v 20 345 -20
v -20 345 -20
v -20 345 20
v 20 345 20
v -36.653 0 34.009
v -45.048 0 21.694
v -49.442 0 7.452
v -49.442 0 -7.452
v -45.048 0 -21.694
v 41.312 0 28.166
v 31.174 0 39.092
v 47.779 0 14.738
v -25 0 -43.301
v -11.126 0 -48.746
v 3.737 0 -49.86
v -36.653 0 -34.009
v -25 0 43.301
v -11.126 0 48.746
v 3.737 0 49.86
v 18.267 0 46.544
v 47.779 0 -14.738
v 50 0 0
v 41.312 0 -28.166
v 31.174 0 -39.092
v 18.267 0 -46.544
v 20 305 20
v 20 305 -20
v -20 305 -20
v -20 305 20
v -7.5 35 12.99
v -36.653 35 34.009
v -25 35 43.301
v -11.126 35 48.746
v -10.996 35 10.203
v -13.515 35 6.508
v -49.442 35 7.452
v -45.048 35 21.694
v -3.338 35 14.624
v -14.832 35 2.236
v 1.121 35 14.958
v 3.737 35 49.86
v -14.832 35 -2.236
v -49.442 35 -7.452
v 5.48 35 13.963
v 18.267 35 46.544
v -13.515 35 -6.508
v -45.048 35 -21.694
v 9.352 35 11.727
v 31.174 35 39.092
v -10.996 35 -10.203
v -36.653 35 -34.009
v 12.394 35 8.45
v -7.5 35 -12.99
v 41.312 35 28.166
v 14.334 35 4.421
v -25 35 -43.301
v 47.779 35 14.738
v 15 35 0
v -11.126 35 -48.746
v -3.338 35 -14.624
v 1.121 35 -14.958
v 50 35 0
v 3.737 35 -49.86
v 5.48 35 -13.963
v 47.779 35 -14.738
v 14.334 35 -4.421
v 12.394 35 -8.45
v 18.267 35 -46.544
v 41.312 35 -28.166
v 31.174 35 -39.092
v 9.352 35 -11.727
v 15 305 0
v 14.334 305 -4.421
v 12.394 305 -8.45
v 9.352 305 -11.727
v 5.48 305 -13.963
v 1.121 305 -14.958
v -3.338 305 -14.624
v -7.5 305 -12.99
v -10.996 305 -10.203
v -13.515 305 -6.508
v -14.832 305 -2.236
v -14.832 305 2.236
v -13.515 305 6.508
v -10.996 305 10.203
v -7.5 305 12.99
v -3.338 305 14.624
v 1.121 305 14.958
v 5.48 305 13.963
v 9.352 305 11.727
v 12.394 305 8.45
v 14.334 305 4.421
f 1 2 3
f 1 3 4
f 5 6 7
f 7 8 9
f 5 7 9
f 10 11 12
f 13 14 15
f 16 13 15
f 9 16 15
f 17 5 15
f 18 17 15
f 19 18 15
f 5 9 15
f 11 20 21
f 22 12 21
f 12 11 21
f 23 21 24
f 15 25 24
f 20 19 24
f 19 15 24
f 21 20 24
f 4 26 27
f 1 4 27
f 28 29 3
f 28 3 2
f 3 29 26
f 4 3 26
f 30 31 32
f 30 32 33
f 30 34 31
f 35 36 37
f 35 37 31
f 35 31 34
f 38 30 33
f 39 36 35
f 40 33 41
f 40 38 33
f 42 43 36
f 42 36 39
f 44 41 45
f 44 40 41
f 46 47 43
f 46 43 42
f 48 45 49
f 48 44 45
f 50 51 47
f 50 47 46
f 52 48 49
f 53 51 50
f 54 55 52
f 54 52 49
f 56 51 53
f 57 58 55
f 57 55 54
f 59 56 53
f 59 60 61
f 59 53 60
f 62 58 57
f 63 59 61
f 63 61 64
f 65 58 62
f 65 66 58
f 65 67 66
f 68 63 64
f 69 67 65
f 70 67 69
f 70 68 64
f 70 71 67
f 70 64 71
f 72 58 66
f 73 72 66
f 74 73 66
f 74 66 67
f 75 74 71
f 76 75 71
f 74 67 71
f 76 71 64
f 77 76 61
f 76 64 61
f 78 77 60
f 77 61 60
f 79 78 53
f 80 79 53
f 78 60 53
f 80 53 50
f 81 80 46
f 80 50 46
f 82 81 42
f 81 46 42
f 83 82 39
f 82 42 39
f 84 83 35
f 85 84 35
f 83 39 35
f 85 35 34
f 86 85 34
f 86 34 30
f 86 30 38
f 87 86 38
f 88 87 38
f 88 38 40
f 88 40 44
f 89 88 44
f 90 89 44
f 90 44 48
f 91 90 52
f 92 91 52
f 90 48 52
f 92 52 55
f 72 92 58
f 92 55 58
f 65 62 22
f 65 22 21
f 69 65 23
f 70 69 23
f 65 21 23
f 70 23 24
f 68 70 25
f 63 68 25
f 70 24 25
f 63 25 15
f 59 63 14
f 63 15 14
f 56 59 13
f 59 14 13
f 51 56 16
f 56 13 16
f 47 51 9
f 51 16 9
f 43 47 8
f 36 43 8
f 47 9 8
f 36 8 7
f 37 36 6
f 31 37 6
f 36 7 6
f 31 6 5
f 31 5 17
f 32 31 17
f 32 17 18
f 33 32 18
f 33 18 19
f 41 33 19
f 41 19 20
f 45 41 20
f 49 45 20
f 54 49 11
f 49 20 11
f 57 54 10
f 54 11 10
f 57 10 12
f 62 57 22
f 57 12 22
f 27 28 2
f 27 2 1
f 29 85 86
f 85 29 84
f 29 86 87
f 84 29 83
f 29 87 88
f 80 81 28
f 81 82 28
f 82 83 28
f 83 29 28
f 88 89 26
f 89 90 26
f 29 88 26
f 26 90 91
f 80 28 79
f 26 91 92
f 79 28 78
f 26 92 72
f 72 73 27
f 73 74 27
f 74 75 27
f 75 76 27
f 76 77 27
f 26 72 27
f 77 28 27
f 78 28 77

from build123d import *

# Parameters (mm, degrees)
SKETCH1_R           = 50
BOSS_EXTRUDE1_DEPTH = 35
SKETCH2_R           = 15
BOSS_EXTRUDE2_DEPTH = 270
SKETCH3_W           = 40
SKETCH3_H           = 40
BOSS_EXTRUDE3_DEPTH = 40


with BuildPart() as part:
    # Sketch1 → Boss-Extrude1 (new body)
    with BuildSketch(Plane(origin=(0, 0, 0), x_dir=(1, 0, 0), z_dir=(0, 1, 0))):
        Circle(SKETCH1_R)
    extrude(amount=BOSS_EXTRUDE1_DEPTH)

    # Sketch2 → Boss-Extrude2 (add)
    with BuildSketch(Plane(origin=(0, 35, 0), x_dir=(1, 0, 0), z_dir=(0, 1, 0))):
        Circle(SKETCH2_R)
    extrude(amount=BOSS_EXTRUDE2_DEPTH)

    # Sketch3 → Boss-Extrude3 (add)
    with BuildSketch(Plane(origin=(0, 305, 0), x_dir=(1, 0, 0), z_dir=(0, 1, 0))):
        Rectangle(SKETCH3_W, SKETCH3_H)
    extrude(amount=BOSS_EXTRUDE3_DEPTH)


solid = part.part
